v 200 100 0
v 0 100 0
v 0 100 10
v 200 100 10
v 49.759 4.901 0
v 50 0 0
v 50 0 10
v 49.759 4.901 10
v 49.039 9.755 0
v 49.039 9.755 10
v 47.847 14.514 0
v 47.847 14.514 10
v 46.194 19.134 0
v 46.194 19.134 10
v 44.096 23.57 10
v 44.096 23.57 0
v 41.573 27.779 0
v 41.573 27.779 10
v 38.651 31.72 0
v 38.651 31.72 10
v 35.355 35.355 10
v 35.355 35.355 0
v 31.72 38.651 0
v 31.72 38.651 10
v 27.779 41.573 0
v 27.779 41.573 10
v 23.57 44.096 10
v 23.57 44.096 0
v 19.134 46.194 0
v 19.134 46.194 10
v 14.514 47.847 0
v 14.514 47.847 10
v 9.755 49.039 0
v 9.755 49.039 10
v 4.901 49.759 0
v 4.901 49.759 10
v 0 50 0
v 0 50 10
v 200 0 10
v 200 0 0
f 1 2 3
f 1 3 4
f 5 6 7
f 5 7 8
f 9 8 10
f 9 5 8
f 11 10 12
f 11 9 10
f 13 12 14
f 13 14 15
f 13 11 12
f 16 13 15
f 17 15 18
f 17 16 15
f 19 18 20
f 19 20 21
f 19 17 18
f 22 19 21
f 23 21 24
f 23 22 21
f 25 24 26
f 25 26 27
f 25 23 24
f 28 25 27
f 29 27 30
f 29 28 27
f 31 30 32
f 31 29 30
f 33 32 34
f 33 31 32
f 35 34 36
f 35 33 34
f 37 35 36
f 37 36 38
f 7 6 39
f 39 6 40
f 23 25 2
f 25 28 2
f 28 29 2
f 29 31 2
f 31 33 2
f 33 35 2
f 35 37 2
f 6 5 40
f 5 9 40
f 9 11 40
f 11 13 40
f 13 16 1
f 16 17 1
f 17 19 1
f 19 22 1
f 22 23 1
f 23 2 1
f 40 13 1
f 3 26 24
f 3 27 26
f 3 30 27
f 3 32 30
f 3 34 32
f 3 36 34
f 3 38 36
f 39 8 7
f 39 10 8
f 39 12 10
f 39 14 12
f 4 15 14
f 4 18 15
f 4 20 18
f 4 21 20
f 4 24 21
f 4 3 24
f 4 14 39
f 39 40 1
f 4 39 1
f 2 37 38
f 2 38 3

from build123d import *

# Parameters (mm, degrees)
CYLINDER_R     = 50
CYLINDER_DEPTH = 10
BOX_W          = 200
BOX_H          = 100
BOX_DEPTH      = 10


with BuildPart() as cylinder:
    # Cylinder → Cylinder (new body)
    with BuildSketch(Plane.XY):
        Circle(CYLINDER_R)
    extrude(amount=CYLINDER_DEPTH)


with BuildPart() as cut:
    # Box → Box (new body)
    with BuildSketch(Plane.XY):
        with Locations((100, 50)):
            Rectangle(BOX_W, BOX_H)
    extrude(amount=BOX_DEPTH)

    # Cut: cut Cylinder
    add(cylinder.part, mode=Mode.SUBTRACT)


solid = cut.part
